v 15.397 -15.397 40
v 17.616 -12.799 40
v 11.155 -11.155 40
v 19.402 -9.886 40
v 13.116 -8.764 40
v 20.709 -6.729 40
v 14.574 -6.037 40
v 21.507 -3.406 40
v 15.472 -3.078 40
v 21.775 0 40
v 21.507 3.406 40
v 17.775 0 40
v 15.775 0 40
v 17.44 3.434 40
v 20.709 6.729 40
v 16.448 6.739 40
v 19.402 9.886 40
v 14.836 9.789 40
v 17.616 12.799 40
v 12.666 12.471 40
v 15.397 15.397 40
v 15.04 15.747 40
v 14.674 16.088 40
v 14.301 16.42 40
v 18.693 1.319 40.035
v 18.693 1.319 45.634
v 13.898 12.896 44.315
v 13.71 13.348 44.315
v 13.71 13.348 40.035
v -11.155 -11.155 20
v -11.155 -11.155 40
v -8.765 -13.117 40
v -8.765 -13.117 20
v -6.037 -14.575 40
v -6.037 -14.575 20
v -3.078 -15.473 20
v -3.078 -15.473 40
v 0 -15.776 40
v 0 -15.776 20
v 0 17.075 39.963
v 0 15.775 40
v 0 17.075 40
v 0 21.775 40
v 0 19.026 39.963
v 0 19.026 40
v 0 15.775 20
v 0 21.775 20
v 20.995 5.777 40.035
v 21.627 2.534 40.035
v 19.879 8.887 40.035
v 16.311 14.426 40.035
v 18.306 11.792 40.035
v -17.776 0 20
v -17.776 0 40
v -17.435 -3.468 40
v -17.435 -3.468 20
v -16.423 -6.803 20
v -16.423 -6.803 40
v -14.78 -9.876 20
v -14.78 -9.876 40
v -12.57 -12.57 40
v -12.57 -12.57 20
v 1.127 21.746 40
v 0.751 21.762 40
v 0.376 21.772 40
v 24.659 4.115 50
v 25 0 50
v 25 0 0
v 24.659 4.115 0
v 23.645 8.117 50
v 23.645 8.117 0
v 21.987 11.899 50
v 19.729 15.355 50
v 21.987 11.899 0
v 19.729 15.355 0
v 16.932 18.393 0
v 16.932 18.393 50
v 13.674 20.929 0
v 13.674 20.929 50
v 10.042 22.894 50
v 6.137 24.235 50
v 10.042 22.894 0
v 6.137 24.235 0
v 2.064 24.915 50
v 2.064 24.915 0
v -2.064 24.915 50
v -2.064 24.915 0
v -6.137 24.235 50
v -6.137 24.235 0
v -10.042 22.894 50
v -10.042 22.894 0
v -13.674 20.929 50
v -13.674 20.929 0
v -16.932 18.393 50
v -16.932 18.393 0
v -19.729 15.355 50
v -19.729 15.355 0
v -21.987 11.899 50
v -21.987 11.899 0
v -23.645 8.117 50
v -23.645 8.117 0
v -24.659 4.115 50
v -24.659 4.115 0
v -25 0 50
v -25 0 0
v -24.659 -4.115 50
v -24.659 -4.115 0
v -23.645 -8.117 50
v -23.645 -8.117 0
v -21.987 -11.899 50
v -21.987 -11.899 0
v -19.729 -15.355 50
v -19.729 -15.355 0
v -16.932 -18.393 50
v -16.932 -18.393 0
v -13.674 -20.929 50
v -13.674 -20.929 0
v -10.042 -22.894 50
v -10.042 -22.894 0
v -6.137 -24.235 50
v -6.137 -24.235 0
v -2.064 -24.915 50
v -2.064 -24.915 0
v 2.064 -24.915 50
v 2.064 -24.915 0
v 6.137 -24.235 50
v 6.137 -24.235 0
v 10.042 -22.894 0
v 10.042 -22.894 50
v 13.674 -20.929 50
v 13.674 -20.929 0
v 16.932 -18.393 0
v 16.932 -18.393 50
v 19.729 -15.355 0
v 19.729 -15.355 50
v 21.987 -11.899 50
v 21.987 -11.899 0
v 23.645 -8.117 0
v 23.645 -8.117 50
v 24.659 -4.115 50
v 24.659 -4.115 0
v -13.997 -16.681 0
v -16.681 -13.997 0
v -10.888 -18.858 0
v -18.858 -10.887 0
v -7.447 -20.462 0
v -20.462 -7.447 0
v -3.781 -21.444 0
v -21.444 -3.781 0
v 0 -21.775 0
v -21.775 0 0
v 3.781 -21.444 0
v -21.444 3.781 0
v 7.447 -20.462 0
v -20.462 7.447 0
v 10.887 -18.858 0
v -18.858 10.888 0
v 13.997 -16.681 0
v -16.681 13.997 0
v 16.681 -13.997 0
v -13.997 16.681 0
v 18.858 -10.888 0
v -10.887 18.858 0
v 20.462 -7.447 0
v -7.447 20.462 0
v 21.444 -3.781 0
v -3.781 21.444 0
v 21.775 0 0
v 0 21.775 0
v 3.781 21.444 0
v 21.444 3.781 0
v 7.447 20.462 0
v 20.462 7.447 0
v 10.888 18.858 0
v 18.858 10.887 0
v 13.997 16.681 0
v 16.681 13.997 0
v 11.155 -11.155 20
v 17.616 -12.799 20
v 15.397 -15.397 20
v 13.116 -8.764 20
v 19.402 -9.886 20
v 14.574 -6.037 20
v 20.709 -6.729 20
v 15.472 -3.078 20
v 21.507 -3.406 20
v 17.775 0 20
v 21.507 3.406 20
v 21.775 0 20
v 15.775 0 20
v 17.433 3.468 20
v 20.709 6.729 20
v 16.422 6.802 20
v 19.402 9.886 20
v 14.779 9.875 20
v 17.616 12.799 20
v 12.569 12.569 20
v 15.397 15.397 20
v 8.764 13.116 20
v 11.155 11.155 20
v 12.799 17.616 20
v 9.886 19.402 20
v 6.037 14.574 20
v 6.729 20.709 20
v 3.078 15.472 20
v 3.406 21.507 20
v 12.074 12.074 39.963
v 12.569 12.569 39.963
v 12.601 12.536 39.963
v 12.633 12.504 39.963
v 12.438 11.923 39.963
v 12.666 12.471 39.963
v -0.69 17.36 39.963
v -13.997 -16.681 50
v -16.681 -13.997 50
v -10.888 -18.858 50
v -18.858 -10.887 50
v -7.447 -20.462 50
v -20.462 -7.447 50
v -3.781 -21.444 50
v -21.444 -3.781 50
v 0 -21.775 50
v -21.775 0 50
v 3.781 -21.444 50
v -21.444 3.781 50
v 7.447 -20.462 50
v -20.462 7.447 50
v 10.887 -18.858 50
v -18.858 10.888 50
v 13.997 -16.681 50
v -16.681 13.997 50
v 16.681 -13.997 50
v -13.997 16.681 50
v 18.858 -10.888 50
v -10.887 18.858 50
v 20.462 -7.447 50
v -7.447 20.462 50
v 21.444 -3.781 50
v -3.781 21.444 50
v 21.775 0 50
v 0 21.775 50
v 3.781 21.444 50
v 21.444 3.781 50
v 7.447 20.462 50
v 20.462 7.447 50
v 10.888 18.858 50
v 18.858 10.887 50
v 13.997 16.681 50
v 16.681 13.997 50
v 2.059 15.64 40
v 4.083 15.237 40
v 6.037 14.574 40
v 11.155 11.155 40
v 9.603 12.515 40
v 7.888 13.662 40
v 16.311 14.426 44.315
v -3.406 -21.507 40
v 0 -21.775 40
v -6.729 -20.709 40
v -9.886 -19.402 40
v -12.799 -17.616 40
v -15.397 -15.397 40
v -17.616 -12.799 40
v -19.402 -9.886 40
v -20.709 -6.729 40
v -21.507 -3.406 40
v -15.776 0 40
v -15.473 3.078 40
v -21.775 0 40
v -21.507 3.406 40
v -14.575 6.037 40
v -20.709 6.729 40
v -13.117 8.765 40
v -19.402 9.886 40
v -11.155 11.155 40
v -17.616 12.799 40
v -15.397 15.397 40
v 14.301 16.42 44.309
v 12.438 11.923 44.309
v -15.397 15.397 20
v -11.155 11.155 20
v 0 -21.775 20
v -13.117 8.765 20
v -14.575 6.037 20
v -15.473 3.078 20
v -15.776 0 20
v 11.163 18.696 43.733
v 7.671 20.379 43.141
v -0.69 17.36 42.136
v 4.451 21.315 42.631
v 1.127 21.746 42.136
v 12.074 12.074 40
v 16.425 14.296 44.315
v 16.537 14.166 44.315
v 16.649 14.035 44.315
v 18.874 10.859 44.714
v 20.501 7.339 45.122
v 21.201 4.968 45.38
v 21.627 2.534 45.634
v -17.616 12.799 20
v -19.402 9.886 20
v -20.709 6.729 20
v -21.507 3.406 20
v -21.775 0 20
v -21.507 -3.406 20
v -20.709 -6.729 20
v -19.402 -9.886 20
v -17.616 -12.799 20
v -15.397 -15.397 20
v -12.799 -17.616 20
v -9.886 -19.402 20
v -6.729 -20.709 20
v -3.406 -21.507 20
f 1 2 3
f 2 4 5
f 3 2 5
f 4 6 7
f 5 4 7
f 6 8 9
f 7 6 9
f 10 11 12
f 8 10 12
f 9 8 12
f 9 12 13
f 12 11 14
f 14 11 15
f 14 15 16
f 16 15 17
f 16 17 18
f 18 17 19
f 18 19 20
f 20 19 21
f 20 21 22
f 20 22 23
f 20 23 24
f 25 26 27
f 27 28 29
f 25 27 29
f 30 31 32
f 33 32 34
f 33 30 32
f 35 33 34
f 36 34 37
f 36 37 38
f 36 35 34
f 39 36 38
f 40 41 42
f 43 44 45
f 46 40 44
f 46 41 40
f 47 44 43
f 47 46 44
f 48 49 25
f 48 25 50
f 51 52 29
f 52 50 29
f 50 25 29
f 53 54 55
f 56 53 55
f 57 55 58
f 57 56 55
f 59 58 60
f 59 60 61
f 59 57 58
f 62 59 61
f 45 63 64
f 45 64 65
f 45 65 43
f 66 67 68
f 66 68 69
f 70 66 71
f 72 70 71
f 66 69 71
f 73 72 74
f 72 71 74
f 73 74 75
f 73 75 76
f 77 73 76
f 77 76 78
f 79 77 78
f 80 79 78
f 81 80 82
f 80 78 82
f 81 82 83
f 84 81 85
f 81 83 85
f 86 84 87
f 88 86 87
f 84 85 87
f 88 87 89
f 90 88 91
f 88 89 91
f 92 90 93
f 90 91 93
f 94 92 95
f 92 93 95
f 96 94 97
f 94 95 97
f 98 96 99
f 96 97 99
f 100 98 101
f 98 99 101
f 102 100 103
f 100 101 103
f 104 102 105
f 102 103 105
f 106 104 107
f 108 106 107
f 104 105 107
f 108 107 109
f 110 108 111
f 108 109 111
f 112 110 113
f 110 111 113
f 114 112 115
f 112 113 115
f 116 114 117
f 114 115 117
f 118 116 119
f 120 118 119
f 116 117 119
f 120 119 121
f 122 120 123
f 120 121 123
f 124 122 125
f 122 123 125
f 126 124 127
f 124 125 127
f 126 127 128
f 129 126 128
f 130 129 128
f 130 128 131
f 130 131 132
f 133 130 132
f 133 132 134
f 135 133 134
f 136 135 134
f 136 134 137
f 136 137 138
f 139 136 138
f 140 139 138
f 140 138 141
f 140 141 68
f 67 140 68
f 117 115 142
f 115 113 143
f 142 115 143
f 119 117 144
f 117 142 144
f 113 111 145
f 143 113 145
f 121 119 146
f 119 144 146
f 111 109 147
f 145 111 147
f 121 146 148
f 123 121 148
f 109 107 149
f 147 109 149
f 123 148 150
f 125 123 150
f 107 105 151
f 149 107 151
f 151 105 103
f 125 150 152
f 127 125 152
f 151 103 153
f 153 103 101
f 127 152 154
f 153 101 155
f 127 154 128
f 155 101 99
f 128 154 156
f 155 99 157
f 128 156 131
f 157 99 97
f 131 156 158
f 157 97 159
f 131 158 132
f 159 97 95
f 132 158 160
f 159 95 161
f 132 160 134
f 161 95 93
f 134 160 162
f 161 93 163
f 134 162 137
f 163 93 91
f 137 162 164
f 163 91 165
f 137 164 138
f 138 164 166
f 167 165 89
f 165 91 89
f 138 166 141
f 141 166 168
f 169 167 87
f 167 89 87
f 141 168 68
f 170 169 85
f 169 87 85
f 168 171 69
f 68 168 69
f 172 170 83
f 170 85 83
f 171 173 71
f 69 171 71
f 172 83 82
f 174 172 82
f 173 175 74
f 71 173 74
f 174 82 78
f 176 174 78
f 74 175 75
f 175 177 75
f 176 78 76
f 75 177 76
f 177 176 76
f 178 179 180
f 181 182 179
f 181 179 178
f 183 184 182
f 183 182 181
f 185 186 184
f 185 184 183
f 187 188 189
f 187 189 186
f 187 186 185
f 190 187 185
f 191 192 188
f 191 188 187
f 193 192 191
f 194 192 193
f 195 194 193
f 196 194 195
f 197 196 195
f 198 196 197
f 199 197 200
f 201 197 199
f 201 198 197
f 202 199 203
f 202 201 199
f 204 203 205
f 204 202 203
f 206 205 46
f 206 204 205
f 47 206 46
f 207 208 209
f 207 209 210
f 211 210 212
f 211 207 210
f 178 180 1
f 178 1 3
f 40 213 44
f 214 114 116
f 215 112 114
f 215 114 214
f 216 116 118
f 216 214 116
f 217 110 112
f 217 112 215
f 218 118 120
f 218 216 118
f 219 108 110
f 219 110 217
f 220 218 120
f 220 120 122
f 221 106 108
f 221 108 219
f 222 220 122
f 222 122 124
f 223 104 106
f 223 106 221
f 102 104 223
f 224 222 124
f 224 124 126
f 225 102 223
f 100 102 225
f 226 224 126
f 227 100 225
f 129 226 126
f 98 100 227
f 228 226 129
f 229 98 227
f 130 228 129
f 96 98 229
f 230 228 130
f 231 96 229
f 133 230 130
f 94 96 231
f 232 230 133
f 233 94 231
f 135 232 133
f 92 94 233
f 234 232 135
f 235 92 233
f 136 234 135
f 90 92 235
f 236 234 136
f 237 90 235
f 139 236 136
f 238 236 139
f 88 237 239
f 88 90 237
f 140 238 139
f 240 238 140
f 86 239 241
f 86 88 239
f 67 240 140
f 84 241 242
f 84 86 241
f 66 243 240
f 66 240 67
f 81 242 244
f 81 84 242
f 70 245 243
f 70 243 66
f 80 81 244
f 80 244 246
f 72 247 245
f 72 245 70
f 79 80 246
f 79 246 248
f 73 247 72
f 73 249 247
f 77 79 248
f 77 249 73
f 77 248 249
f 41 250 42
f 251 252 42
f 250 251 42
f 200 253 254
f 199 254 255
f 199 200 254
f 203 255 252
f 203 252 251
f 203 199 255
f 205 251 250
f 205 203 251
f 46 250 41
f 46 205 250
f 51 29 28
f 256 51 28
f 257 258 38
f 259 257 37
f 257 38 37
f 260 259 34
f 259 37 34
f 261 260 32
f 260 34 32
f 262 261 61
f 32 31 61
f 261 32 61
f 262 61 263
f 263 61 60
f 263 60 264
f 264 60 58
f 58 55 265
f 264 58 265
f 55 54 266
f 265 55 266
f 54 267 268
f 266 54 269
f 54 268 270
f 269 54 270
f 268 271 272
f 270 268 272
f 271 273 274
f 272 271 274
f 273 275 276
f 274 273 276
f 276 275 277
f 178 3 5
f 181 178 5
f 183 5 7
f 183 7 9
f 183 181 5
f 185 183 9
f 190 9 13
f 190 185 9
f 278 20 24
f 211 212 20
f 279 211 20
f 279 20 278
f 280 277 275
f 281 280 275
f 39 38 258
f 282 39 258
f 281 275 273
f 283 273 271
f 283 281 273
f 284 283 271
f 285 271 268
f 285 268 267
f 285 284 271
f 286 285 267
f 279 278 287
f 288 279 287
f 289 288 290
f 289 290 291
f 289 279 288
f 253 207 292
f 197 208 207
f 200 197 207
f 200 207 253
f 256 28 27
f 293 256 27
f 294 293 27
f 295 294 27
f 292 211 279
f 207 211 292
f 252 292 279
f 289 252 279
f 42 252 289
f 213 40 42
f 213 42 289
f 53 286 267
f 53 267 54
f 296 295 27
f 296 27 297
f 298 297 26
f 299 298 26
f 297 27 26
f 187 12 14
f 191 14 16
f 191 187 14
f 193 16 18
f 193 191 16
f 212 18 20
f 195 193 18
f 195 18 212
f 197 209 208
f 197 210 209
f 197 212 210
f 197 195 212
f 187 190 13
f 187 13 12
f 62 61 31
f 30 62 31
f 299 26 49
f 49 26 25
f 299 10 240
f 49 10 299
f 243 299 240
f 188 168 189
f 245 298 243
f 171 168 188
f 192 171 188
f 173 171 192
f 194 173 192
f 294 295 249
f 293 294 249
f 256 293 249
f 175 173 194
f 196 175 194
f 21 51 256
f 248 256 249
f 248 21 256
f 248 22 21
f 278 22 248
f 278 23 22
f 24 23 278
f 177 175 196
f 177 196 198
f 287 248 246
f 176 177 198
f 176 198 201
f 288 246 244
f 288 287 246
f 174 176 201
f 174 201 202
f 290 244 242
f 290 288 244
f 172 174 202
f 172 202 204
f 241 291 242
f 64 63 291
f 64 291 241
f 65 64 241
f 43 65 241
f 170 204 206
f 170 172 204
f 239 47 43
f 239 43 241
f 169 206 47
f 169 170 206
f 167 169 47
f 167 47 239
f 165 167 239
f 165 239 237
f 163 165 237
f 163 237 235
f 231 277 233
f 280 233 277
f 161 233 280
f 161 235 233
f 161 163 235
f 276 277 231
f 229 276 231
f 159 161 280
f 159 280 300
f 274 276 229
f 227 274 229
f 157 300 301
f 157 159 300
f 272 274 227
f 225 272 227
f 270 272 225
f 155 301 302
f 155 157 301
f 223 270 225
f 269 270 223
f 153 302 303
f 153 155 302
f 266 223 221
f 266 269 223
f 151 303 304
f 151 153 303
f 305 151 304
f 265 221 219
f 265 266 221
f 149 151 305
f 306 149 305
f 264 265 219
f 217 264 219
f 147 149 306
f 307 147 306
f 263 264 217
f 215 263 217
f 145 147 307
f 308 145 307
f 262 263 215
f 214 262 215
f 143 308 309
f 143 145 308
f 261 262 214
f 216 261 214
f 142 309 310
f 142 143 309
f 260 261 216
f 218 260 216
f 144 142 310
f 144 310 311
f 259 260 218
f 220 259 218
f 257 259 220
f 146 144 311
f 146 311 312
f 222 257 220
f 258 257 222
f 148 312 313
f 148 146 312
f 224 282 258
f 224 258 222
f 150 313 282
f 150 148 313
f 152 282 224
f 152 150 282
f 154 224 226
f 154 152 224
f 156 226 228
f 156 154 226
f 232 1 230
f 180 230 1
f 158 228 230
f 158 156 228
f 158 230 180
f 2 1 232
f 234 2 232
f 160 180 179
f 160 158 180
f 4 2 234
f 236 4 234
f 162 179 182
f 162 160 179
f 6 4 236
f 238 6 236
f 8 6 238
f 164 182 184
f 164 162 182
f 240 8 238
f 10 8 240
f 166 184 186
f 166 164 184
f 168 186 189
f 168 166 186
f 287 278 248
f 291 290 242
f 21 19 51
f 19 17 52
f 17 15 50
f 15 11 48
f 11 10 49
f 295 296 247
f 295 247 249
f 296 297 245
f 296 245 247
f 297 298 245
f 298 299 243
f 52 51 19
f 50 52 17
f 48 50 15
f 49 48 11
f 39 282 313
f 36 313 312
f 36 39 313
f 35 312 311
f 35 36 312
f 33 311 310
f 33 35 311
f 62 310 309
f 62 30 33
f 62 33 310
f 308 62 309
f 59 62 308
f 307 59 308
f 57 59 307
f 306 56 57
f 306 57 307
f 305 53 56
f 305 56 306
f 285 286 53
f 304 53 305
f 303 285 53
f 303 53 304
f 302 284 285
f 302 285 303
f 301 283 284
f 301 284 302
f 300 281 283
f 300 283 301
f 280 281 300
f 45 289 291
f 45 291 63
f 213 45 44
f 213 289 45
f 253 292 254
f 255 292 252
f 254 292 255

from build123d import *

# Parameters (mm, degrees)
SKETCH1_R                = 25
SKETCH1_R_2              = 21.775
BOSS_EXTRUDE1_DEPTH      = 50
BOSS_EXTRUDE2_START      = -20
BOSS_EXTRUDE2_DEPTH      = 20
BOSS_EXTRUDE3_REACH      = 60.561
BOSS_EXTRUDE4_REACH      = 62.226
BOSS_EXTRUDE4_END_RADIUS = 21.775


with BuildPart() as part:
    # Sketch1 → Boss-Extrude1 (new body)
    with BuildSketch(Plane.XY):
        Circle(SKETCH1_R)
        Circle(SKETCH1_R_2, mode=Mode.SUBTRACT)
    extrude(amount=BOSS_EXTRUDE1_DEPTH)

    # Sketch2 → Boss-Extrude2 (add)
    with BuildSketch(Plane(origin=(0, 0, 0), x_dir=(-1, 0, 0), z_dir=(0, 0, -1)).offset(BOSS_EXTRUDE2_START)):
        with BuildLine():
            Line((0, -15.77607933), (0, -21.775))
            ThreePointArc((0, -21.775), (8.33293174, -20.11747682), (15.39725016, -15.39725016))
            Line((15.39725016, -15.39725016), (12.569586237, -12.569586237))
            Line((12.569586237, -12.569586237), (11.198401724, -11.198401724))
            Line((11.198401724, -11.198401724), (11.155372675, -11.155372675))
            ThreePointArc((11.155372675, -11.155372675), (6.037244187, -14.575196796), (0, -15.77607933))
        make_face()
        with BuildLine():
            Line((12.569586237, -12.569586237), (15.39725016, -15.39725016))
            ThreePointArc((15.39725016, -15.39725016), (20.11747682, -8.33293174), (21.775, 0))
            Line((21.775, 0), (17.77607933, 0))
            ThreePointArc((17.77607933, 0), (16.422955861, -6.802611052), (12.569586237, -12.569586237))
        make_face()
        with BuildLine():
            ThreePointArc((21.775, 0), (20.11747682, 8.33293174), (15.39725016, 15.39725016))
            Line((15.39725016, 15.39725016), (11.155372675, 11.155372675))
            ThreePointArc((11.155372675, 11.155372675), (14.575196796, 6.037244187), (15.77607933, 0))
            Line((15.77607933, 0), (17.77607933, 0))
            Line((17.77607933, 0), (21.775, 0))
        make_face()
        with BuildLine():
            ThreePointArc((0, 21.775), (-8.33293174, 20.11747682), (-15.39725016, 15.39725016))
            Line((-15.39725016, 15.39725016), (-12.568823036, 12.568823036))
            Line((-12.568823036, 12.568823036), (-11.154609473, 11.154609473))
            ThreePointArc((-11.154609473, 11.154609473), (-6.036831146, 14.574199625), (0, 15.775))
            Line((0, 15.775), (0, 21.775))
        make_face()
        with BuildLine():
            ThreePointArc((-15.39725016, 15.39725016), (-20.11747682, 8.33293174), (-21.775, 0))
            Line((-21.775, 0), (-17.775, 0))
            ThreePointArc((-17.775, 0), (-16.42195869, 6.80219801), (-12.568823036, 12.568823036))
            Line((-12.568823036, 12.568823036), (-15.39725016, 15.39725016))
        make_face()
        with BuildLine():
            Line((-17.775, 0), (-21.775, 0))
            ThreePointArc((-21.775, 0), (-20.11747682, -8.33293174), (-15.39725016, -15.39725016))
            Line((-15.39725016, -15.39725016), (-11.154609473, -11.154609473))
            ThreePointArc((-11.154609473, -11.154609473), (-14.574199625, -6.036831146), (-15.775, 0))
            Line((-15.775, 0), (-17.775, 0))
        make_face()
    extrude(amount=-BOSS_EXTRUDE2_DEPTH)

    # Sketch3 → Boss-Extrude3 (add, up to next)
    with BuildSketch(Plane(origin=(6.036831146, 14.574199625, 20), x_dir=(-0.9238795325112862, 0.38268343236509134, 0), z_dir=(-0.38268343236509134, -0.9238795325112862, 0)), mode=Mode.PRIVATE) as boss_extrude3_sk1:
        Polygon((7.280816653, -19.963261278), (-6.92881971, -19.963261278), (-6.92881971, -24.309436753), (7.280816653, -22.136349016), align=None)
    boss_extrude3_tool1 = extrude(boss_extrude3_sk1.sketch, amount=-BOSS_EXTRUDE3_REACH, mode=Mode.PRIVATE) - part.part
    add(boss_extrude3_tool1.solids().sort_by_distance((6.603563, 14.339452, 41.653441))[0])

    # Boss-Extrude4: up to this cylinder (the profile starts inside it)
    boss_extrude4_end = Plane(origin=(0, 0, 42.508231), z_dir=(0, 0, -1)) * Cylinder(BOSS_EXTRUDE4_END_RADIUS, 169.002, mode=Mode.PRIVATE)
    # Sketch4 → Boss-Extrude4 (add, up to the surface)
    with BuildSketch(Plane(origin=(16.42195869, 6.80219801, 20), x_dir=(0, 0, 1), z_dir=(-0.9238795325112876, -0.38268343236508784, 0)), mode=Mode.PRIVATE) as boss_extrude4_sk1:
        Polygon((24.315182013, 6.595374184), (25.634239275, -5.93507645), (20.034984376, -5.93507645), (20.034984376, 7.085544356), (24.315182013, 7.085544356), align=None)
    boss_extrude4_tool1 = extrude(boss_extrude4_sk1.sketch, amount=-BOSS_EXTRUDE4_REACH, mode=Mode.PRIVATE) & boss_extrude4_end
    add(boss_extrude4_tool1.solids().sort_by_distance((16.317145, 7.05524, 42.508231))[0])


solid = part.part
